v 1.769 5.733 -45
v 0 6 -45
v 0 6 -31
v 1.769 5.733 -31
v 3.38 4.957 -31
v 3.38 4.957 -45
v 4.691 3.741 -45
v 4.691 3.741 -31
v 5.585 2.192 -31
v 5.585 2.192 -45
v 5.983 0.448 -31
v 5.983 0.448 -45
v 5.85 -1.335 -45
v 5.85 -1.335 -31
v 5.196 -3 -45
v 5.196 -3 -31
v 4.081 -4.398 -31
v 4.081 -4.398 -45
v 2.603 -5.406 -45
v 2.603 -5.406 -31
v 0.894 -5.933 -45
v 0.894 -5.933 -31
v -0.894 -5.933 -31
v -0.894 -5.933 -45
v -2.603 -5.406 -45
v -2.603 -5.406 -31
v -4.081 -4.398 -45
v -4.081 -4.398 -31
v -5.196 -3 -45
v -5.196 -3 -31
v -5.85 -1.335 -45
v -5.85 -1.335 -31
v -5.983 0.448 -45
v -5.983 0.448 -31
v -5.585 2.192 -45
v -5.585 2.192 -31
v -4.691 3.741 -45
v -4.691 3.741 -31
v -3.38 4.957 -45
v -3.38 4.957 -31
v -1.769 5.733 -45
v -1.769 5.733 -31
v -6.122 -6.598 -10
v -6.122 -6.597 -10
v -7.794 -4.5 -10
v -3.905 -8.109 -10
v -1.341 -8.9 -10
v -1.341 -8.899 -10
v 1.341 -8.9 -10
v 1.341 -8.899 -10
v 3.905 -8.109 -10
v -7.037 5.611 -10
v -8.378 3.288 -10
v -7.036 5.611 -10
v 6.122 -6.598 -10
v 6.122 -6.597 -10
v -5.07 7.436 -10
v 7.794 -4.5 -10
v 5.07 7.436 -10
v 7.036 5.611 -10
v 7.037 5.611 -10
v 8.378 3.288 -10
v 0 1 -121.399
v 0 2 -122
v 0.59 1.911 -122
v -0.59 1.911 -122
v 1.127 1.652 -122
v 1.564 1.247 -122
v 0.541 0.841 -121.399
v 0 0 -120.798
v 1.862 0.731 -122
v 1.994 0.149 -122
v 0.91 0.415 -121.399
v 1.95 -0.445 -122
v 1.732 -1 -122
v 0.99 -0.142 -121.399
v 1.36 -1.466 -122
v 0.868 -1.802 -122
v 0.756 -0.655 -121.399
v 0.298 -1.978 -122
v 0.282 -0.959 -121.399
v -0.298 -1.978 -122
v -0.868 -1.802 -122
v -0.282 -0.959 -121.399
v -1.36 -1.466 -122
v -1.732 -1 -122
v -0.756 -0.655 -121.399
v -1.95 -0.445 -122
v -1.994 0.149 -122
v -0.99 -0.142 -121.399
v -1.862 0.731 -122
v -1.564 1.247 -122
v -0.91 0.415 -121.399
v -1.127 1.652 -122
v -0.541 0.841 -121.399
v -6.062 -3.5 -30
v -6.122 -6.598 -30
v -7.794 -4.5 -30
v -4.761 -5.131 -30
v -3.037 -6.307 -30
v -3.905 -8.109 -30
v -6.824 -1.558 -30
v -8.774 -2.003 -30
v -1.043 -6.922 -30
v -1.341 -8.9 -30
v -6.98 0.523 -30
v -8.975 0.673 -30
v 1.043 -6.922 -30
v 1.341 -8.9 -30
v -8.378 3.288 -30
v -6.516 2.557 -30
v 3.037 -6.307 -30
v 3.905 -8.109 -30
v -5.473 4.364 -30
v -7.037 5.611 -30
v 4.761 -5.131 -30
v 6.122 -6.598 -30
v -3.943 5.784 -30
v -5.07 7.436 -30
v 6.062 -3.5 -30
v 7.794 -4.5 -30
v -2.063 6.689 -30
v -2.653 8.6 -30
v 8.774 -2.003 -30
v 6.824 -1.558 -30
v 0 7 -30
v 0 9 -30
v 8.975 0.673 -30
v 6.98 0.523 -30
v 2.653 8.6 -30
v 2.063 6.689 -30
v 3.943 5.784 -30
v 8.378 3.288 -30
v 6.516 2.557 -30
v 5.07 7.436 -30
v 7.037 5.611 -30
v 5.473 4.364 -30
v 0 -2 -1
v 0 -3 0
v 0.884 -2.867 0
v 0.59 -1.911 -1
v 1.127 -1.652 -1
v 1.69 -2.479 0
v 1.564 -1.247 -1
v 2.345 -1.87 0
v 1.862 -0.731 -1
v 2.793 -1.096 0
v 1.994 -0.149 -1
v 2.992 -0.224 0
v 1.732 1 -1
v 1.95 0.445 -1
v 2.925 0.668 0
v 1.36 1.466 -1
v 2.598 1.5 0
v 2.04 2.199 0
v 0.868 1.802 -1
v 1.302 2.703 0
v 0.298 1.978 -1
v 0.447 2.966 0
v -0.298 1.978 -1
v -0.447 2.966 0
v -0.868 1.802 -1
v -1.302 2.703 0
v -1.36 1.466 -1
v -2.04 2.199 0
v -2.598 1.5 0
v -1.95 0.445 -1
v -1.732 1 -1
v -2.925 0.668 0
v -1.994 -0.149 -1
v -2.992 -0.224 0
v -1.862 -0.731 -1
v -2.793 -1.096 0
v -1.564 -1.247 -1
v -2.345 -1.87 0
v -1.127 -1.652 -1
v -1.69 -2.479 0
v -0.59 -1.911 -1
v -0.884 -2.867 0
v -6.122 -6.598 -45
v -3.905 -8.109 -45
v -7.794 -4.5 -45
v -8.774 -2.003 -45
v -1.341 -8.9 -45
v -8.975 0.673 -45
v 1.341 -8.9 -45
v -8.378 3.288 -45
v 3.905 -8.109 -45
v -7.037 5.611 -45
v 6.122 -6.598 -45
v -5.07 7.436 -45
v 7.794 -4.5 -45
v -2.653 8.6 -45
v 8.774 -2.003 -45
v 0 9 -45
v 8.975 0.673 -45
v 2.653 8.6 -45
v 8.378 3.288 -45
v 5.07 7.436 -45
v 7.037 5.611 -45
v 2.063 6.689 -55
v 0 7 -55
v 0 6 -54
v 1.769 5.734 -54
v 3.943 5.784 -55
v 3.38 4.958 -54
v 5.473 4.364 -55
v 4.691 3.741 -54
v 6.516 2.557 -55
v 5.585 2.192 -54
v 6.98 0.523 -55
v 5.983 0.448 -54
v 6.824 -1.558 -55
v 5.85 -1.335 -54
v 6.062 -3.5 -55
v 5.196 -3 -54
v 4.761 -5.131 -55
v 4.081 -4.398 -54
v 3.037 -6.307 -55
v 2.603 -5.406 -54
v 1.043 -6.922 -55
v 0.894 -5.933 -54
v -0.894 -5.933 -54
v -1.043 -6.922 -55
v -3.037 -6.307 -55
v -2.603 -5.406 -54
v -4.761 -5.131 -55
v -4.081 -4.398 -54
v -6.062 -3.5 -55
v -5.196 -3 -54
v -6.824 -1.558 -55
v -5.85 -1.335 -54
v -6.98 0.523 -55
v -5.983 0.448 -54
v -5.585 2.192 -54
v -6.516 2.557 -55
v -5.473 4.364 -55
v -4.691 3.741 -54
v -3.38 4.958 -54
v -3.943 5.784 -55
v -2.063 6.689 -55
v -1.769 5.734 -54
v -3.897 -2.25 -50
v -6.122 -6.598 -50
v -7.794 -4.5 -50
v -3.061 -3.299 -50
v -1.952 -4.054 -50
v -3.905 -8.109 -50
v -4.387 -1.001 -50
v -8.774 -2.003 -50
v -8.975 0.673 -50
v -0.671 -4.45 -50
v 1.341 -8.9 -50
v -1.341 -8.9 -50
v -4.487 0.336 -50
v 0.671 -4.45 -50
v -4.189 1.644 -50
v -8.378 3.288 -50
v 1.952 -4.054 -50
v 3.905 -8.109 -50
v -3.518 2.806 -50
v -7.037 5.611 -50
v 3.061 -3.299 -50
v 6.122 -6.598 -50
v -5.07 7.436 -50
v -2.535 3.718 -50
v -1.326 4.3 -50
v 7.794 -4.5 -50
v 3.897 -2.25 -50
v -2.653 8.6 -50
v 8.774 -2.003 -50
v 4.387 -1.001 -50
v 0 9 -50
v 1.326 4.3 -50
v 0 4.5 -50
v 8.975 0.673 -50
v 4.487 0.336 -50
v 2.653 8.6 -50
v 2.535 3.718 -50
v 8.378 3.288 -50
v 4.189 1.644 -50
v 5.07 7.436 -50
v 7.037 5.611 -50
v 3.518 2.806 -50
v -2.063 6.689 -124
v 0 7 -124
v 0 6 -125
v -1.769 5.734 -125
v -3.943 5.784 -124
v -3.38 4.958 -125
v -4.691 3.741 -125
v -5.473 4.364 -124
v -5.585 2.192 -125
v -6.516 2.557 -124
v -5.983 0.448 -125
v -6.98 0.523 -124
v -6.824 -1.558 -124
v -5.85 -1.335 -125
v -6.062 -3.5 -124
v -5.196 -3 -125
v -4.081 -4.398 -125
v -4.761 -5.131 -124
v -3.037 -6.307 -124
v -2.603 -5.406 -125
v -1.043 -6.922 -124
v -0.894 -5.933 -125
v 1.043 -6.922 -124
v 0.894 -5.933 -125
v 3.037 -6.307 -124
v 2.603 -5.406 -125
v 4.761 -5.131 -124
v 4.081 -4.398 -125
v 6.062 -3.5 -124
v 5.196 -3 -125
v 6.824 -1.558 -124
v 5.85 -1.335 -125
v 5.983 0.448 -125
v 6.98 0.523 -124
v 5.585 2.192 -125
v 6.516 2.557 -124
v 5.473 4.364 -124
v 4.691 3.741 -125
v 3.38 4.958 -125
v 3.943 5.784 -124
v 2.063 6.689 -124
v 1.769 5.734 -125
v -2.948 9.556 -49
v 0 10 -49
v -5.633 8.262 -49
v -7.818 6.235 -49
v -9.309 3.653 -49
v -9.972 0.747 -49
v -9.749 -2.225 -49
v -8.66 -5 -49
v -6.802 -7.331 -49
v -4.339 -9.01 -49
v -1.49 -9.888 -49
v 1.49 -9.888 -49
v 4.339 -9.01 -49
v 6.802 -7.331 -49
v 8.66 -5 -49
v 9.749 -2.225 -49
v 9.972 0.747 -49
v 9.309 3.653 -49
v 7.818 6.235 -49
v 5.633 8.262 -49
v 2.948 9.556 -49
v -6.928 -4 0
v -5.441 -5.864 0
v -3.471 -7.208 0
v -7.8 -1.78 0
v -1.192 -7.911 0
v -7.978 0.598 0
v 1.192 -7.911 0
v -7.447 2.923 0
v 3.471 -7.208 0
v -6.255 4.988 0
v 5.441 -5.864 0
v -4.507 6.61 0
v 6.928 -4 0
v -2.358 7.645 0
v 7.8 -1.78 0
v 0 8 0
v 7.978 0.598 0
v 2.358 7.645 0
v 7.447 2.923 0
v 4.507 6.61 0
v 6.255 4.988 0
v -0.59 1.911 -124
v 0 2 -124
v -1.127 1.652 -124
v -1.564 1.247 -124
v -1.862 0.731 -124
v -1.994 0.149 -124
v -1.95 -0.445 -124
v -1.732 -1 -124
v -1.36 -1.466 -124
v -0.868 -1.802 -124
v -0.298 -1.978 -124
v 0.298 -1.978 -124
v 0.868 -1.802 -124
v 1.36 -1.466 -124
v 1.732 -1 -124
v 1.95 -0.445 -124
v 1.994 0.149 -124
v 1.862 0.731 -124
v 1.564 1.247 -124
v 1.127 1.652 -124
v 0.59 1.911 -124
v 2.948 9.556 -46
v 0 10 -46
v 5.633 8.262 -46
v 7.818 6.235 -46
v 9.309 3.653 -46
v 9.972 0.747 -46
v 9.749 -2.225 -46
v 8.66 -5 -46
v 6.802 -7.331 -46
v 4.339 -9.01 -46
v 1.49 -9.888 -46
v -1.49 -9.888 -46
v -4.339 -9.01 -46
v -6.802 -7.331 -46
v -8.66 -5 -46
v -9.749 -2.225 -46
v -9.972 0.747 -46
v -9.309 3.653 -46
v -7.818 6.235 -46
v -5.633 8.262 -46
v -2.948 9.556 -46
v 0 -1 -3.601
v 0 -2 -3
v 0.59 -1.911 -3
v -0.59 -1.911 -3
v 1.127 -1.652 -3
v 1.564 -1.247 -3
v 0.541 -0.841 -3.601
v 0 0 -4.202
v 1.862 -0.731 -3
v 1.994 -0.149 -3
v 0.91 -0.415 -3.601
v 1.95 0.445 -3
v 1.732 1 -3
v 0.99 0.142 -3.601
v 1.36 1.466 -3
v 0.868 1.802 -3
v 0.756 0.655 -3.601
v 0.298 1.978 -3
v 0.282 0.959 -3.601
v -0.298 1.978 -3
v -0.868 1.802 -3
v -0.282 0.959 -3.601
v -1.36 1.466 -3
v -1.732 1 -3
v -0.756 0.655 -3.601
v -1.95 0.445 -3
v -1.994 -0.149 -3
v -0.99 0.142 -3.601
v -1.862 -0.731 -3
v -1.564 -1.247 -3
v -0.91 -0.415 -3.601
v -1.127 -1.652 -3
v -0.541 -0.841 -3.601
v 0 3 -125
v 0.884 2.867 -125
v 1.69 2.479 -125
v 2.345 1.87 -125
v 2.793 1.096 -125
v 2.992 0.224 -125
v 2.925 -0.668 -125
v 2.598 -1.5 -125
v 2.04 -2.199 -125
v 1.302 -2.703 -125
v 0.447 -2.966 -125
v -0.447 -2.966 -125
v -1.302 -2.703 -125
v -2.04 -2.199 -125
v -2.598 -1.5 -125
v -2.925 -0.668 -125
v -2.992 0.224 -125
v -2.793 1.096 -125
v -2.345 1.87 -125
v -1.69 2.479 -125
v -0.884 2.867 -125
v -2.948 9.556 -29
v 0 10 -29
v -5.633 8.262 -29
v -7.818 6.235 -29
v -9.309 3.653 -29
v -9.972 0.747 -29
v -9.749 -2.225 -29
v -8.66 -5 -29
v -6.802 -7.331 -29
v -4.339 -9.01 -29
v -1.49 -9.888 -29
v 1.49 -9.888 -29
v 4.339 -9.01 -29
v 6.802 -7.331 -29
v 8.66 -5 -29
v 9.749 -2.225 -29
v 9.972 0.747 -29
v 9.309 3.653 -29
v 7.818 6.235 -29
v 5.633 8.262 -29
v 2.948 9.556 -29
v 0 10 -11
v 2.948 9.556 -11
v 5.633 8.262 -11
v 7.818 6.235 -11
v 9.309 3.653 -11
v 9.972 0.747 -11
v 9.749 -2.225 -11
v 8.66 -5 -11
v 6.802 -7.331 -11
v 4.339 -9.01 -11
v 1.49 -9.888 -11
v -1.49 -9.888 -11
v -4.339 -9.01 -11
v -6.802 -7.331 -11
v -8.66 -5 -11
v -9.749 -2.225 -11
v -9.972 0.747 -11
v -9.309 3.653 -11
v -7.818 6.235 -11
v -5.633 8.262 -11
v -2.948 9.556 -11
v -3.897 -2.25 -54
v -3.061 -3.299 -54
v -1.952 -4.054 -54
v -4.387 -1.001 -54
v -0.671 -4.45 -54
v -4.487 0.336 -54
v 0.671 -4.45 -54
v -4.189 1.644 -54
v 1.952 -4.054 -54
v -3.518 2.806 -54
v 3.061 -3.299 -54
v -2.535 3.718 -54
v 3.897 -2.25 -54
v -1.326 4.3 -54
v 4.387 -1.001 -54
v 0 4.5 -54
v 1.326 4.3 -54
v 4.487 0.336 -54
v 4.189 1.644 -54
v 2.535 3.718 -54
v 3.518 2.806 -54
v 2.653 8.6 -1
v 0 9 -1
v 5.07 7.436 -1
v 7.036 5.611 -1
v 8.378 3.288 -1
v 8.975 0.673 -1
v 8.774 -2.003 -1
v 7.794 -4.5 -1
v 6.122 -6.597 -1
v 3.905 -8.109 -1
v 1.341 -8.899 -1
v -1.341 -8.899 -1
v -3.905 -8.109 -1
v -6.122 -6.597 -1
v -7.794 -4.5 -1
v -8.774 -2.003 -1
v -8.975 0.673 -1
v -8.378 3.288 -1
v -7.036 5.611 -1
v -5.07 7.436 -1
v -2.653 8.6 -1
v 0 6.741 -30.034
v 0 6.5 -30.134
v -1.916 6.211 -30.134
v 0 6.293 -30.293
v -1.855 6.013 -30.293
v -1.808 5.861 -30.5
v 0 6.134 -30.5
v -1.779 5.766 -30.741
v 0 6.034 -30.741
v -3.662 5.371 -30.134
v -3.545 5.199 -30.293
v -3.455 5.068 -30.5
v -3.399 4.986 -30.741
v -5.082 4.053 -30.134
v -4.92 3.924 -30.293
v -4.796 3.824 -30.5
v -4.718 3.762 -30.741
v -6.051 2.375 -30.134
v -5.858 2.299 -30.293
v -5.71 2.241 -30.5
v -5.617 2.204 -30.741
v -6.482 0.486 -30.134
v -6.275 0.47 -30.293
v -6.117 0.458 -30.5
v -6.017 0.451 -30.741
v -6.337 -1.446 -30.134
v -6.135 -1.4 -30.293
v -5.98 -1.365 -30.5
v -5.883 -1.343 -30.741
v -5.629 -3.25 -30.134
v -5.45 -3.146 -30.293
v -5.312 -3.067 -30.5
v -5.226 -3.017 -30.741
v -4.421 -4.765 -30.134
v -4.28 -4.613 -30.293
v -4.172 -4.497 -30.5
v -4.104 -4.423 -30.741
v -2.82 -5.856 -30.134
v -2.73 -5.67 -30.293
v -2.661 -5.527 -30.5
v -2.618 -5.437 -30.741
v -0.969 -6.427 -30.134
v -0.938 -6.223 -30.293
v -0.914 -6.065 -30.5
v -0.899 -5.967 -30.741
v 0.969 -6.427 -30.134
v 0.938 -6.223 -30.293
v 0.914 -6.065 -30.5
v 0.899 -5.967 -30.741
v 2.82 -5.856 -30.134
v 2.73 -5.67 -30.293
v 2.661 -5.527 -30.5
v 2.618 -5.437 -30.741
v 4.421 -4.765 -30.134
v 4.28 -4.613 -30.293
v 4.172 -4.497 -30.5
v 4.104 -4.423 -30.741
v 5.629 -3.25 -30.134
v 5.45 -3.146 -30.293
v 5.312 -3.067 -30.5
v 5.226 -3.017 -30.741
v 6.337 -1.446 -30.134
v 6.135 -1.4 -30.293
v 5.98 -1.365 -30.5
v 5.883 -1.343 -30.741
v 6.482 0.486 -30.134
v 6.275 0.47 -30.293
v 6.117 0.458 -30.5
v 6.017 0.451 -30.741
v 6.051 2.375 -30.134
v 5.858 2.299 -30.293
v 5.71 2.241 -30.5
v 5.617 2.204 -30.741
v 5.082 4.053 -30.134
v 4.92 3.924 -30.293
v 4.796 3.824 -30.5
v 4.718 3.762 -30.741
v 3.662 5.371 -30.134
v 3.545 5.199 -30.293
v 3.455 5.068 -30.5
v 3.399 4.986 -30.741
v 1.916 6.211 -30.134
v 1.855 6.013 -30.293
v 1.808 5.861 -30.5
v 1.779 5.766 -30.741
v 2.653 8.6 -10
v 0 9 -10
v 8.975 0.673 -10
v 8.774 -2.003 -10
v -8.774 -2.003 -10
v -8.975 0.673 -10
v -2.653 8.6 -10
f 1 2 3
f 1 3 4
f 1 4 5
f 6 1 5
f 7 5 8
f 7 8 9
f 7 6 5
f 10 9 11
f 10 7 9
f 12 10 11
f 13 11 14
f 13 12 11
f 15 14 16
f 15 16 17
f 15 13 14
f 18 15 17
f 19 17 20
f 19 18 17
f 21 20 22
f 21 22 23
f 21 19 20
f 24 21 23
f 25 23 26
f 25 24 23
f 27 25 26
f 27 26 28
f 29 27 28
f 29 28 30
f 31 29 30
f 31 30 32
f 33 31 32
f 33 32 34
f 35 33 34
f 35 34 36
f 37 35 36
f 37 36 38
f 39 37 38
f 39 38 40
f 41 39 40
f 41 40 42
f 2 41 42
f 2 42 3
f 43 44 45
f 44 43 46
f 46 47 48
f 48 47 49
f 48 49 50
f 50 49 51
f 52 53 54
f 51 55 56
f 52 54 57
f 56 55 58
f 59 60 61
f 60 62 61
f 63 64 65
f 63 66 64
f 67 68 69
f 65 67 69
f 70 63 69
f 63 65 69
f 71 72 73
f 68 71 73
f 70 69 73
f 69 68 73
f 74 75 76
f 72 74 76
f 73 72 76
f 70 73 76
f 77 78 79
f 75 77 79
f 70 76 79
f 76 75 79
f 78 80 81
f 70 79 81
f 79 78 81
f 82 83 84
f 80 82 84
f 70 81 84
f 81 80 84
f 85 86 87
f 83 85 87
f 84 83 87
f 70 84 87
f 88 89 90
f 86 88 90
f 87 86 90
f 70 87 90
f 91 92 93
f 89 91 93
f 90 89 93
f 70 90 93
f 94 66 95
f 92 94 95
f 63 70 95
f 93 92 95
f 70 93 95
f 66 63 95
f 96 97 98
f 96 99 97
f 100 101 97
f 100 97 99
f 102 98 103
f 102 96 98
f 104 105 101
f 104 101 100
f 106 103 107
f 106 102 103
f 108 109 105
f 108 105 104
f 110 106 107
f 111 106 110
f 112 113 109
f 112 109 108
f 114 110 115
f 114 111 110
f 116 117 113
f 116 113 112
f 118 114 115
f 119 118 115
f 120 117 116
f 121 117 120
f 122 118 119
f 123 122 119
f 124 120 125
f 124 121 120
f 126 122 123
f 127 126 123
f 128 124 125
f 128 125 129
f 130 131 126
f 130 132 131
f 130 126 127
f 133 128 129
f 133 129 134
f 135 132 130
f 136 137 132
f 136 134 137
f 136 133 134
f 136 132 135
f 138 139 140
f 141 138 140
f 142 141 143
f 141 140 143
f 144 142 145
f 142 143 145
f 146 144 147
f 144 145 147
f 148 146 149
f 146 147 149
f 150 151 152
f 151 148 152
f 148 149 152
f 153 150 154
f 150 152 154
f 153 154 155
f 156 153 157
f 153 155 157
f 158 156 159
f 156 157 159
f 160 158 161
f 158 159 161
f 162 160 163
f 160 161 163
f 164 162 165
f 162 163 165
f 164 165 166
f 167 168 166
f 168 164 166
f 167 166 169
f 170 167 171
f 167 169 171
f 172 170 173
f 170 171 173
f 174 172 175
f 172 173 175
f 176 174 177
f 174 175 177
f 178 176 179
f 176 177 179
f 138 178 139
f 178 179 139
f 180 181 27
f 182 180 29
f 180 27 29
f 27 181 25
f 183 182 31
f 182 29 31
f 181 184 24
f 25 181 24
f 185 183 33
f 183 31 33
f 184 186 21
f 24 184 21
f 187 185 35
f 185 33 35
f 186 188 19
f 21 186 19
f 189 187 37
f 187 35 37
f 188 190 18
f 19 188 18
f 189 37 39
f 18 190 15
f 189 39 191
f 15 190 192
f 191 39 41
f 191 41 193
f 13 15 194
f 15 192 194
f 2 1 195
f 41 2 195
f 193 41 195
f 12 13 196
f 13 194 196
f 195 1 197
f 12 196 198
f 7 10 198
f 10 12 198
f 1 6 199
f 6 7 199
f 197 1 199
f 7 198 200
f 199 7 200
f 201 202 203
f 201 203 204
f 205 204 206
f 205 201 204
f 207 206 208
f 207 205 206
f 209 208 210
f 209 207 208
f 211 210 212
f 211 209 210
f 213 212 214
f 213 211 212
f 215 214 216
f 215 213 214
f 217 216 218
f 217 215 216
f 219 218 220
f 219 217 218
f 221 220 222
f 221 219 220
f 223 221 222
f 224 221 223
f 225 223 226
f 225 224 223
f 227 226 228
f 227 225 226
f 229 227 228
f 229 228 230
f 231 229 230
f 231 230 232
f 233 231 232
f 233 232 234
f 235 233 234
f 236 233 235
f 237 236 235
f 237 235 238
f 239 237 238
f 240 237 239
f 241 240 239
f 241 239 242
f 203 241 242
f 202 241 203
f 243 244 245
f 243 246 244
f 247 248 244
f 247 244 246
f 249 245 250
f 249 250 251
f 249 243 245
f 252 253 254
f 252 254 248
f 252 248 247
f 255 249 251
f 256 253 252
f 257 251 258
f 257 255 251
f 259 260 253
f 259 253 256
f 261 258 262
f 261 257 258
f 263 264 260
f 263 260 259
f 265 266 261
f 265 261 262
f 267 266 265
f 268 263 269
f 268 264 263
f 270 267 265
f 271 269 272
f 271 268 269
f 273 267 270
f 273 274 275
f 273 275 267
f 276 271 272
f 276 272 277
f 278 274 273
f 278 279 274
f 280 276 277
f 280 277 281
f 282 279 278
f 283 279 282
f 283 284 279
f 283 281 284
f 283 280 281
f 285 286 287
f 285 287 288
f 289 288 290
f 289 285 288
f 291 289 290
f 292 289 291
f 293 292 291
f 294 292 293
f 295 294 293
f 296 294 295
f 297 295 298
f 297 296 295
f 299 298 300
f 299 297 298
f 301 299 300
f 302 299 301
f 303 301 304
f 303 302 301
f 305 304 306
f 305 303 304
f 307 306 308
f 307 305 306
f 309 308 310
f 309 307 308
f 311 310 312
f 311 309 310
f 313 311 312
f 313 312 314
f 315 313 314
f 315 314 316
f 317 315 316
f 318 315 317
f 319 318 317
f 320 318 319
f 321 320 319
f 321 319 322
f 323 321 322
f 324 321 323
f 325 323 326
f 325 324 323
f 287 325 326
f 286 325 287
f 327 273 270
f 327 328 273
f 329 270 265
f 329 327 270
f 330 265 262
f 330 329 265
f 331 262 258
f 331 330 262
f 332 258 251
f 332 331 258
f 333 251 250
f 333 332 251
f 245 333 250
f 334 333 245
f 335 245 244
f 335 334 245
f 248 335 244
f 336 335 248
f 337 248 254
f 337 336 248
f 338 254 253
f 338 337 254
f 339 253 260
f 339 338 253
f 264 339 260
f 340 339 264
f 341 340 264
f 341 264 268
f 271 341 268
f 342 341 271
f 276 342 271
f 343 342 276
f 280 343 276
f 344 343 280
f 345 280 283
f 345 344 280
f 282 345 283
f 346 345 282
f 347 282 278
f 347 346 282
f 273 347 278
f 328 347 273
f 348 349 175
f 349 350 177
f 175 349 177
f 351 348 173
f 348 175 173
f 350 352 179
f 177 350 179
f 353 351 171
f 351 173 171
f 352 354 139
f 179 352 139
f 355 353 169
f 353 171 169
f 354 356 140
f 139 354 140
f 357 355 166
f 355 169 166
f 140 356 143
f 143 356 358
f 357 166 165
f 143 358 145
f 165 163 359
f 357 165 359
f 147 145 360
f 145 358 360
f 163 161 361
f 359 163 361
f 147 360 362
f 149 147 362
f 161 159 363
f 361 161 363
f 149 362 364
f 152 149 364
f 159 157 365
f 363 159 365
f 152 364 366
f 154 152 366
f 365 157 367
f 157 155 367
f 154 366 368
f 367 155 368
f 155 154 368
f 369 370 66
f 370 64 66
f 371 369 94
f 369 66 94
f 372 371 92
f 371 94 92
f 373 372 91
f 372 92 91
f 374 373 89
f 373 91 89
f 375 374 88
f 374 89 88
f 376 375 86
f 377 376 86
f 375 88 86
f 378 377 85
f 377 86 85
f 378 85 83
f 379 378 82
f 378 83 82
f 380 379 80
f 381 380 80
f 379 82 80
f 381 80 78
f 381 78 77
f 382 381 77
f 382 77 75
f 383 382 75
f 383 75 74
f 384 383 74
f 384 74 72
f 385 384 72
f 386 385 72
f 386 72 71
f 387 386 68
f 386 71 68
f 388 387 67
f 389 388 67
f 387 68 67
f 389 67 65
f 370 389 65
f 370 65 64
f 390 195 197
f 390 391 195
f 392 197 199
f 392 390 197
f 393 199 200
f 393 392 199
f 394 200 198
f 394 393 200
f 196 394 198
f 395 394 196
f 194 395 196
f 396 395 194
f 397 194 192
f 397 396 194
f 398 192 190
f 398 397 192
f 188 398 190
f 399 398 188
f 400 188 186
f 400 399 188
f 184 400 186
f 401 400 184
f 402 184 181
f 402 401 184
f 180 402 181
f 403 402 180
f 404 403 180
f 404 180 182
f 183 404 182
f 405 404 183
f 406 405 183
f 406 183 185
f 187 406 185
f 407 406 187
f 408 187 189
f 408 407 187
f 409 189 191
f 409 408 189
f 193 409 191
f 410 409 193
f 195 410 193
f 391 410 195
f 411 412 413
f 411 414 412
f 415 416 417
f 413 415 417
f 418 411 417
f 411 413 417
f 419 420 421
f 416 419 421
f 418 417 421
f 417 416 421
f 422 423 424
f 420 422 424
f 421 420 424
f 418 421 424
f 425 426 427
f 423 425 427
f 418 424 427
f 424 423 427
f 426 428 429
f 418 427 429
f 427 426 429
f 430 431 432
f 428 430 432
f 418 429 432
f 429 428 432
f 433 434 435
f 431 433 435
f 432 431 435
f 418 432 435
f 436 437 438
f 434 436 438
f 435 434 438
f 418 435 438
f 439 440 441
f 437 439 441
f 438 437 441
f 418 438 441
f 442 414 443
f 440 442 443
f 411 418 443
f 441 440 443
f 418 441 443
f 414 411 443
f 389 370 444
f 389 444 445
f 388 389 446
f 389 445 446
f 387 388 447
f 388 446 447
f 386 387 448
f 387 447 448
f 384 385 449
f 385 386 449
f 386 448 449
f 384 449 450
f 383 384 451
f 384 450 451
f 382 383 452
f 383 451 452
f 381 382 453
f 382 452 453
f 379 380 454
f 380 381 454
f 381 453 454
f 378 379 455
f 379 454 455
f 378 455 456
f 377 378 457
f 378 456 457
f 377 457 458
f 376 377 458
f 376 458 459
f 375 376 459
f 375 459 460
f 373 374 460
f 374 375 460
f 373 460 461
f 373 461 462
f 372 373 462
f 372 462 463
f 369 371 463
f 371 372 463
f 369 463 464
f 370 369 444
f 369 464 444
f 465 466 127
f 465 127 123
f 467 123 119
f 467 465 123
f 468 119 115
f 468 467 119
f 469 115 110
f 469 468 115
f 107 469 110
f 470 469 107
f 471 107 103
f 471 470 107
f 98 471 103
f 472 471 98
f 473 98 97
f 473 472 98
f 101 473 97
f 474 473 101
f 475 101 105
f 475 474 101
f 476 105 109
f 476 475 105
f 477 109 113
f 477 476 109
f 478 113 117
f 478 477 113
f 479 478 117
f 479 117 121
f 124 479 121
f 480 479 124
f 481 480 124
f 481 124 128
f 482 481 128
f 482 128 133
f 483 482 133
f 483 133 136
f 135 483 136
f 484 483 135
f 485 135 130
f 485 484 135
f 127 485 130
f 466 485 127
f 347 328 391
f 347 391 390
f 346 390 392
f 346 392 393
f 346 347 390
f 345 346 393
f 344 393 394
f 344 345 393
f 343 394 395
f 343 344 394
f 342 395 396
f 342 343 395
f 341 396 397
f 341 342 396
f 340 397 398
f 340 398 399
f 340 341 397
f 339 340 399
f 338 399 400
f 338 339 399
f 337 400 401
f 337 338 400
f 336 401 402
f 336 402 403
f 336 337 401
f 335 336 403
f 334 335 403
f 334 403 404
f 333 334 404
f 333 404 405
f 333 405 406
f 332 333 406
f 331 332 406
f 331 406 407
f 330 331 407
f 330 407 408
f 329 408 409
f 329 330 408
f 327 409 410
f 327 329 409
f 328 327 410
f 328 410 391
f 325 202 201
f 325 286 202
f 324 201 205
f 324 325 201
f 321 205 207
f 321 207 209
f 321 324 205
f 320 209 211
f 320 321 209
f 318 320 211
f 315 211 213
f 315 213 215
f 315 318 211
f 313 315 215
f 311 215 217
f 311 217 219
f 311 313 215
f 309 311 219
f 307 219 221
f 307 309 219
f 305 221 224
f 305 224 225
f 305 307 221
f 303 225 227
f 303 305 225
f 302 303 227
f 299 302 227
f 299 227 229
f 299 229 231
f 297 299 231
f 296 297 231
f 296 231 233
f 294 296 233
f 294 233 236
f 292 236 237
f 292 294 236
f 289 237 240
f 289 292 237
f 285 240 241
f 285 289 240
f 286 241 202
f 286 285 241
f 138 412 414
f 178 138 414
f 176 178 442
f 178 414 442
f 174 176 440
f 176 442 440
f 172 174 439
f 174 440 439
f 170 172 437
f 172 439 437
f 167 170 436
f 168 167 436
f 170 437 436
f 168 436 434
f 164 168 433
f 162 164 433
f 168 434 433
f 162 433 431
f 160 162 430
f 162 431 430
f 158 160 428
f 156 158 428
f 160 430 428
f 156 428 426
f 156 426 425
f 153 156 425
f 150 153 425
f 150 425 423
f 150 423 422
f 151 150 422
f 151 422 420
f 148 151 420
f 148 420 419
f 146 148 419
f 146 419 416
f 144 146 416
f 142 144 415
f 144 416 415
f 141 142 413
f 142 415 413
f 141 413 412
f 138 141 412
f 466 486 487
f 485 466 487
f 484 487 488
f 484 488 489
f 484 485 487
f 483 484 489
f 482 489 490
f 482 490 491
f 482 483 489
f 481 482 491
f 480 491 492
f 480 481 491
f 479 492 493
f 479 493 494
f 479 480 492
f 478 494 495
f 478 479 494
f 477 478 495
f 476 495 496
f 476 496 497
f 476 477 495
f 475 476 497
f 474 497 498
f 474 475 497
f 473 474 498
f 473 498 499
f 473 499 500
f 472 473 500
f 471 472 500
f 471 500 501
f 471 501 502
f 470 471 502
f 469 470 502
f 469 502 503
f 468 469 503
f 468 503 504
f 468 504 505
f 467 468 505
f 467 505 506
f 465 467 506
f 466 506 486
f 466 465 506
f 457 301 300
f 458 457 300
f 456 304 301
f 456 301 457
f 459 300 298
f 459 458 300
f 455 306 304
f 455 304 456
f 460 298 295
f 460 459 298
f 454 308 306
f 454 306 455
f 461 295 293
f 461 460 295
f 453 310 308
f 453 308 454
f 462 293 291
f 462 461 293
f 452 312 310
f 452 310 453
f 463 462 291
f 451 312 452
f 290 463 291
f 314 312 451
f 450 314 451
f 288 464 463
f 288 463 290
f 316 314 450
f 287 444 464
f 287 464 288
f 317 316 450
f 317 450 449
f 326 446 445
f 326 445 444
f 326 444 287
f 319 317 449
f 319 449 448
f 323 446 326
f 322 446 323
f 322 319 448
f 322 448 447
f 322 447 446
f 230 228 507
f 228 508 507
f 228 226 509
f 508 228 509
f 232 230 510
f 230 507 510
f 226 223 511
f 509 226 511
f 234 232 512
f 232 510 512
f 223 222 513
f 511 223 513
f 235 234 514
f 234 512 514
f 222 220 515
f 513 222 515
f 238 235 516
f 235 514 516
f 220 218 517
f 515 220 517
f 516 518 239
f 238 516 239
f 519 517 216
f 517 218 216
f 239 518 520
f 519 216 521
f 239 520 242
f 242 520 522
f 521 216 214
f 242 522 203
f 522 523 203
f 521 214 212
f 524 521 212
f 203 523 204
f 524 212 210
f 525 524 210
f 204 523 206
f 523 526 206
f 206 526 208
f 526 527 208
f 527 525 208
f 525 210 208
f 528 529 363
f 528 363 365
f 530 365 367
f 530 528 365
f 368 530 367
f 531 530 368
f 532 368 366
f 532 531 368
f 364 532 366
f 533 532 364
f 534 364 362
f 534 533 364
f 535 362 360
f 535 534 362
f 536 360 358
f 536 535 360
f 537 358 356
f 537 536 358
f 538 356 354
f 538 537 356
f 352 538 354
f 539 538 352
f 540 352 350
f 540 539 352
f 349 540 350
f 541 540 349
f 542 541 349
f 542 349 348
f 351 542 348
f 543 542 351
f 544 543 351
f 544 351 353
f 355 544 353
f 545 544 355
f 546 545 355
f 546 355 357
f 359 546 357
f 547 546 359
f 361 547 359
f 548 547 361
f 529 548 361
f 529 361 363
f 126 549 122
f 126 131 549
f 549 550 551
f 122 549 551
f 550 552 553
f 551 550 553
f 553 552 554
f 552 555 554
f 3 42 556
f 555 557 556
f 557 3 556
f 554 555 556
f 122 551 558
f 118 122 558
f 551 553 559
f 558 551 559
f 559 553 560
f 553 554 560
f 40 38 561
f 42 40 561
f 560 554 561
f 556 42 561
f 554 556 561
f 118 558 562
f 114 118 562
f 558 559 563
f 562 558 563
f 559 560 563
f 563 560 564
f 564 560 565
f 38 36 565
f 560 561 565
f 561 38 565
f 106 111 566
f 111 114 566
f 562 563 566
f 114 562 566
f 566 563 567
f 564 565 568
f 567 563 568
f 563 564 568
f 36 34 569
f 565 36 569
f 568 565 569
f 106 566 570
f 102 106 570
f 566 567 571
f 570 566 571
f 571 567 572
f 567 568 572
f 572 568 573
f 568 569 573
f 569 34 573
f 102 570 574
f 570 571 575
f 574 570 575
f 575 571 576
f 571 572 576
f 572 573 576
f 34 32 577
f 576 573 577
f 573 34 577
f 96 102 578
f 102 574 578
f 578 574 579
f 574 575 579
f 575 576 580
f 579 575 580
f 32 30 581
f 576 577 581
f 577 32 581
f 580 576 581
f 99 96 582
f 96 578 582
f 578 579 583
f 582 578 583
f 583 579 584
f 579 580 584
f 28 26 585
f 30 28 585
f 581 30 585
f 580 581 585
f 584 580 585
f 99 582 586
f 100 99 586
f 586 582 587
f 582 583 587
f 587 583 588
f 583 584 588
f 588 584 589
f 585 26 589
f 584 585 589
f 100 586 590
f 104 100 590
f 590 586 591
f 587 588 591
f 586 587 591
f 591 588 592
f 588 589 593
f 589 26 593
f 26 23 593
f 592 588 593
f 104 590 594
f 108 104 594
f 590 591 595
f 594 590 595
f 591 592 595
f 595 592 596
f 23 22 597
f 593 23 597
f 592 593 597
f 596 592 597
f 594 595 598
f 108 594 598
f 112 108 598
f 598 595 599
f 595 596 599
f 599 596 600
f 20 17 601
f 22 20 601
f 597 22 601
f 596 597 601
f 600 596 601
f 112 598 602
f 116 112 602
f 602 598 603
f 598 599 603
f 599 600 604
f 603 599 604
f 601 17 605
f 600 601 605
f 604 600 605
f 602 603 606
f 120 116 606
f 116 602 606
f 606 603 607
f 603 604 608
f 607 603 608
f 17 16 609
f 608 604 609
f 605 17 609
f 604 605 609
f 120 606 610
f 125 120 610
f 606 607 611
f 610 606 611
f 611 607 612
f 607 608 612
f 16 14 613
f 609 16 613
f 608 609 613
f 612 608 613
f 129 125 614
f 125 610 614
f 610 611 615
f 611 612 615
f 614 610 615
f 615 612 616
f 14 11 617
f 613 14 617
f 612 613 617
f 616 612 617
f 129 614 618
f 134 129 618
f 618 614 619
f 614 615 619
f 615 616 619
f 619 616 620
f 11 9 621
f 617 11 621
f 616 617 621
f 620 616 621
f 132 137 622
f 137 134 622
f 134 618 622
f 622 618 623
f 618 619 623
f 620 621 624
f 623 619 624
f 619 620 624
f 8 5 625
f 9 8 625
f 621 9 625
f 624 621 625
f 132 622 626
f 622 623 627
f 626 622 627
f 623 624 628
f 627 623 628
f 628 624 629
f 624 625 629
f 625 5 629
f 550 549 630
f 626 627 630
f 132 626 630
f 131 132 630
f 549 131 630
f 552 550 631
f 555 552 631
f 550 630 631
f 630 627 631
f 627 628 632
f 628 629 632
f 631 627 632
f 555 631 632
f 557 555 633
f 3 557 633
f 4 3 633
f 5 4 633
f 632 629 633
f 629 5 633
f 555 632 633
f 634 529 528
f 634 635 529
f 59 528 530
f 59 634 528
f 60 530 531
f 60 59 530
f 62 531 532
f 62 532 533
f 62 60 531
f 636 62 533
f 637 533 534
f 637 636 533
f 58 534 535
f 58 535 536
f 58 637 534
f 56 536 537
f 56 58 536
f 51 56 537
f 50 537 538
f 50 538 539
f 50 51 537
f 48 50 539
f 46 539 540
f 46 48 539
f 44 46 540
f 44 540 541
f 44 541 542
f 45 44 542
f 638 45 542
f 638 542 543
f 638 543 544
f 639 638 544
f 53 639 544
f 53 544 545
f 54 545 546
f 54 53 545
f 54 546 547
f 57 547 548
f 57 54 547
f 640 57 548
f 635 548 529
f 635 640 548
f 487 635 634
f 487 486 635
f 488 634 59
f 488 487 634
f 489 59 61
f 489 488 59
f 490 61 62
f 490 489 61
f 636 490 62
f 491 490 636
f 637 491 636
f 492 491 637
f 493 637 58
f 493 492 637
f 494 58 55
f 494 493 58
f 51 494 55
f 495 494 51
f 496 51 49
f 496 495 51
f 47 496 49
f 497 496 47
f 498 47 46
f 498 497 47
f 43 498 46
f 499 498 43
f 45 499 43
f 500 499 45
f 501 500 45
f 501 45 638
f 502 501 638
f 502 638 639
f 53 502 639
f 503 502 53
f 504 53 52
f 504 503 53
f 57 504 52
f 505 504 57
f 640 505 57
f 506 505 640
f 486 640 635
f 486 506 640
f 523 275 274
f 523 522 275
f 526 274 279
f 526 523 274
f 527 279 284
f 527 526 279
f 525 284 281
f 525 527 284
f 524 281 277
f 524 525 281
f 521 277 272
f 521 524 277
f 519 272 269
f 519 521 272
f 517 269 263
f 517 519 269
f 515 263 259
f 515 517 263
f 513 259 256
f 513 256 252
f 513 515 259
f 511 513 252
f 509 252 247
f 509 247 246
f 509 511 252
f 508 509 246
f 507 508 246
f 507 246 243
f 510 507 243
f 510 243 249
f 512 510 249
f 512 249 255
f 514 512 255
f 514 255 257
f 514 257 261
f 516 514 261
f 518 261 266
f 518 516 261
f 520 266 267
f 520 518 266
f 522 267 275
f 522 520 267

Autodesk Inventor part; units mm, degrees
ref_plane "YZ Plane" through (0, 0, 0) normal (1, 0, 0) x (0, 1, 0)
ref_plane "XZ Plane" through (0, 0, 0) normal (0, 1, 0) x (-1, 0, 0)
ref_plane "XY Plane" through (0, 0, 0) normal (0, 0, 1) x (1, 0, 0)
sketch "Sketch1" plane through (0, 0, 0) normal (1, 0, 0) x (0, 1, 0)
  line L0 (0, 0) -> (9, 0)
  line L1 (9, 0) -> (9, -10)
  line L2 (9, -10) -> (10, -10)
  line L3 (10, -10) -> (10, -30)
  line L4 (10, -30) -> (6, -30)
  line L5 (6, -30) -> (6, -45)
  line L6 (6, -45) -> (10, -45)
  line L7 (10, -45) -> (10, -50)
  line L8 (0, 0) -> (0, -125)
  line L9 (10, -50) -> (4.5, -50)
  line L10 (4.5, -50) -> (4.5, -54)
  line L11 (4.5, -54) -> (7, -54)
  line L12 (7, -54) -> (7, -125)
  line L13 (7, -125) -> (0, -125)
  dimension "d1" = 18
  dimension "d2" = 20
  dimension "d3" = 12
  dimension "d4" = 20
  dimension "d5" = 9
  dimension "d6" = 14
  dimension "d7" = 20
  dimension "d8" = 15
  dimension "d9" = 4
  dimension "d10" = 5
  dimension "d11" = 71
  dimension "d12" = 125
revolve "Revolution1" add sketch "Sketch1" angle 360 about axis through (0, 0, 0) along (0, 0, -1)
thread "Thread1" size "M14x2" class "6g" standard "ANSI Metric M Profile" full length
hole "Hole1" at (0, 0, 0) direction (0, 0, -1) diameter 4 depth 3 tip angle 118
sketch "Sketch2" plane through (0, 0, -125) normal (0, 0, -1) x (-1, 0, 0)
  point P0 (0, 0)
  point P1 (0, 0)
hole "Hole2" at (0, 0, -125) direction (0, 0, 1) diameter 4 depth 3 tip angle 118
chamfer "Chamfer1" distance 1 angle 45 9 edges at (0, -9, 0) (0, 2, 0) (0, -10, -10) (0, -10, -45) (0, -10, -50) (0, -7, -54) (0, -7, -125) (0, -2, -125) (0, -10, -30)
fillet "Fillet1" radius 1 1 edges at (0, -6, -30)
properties part number "b7"
